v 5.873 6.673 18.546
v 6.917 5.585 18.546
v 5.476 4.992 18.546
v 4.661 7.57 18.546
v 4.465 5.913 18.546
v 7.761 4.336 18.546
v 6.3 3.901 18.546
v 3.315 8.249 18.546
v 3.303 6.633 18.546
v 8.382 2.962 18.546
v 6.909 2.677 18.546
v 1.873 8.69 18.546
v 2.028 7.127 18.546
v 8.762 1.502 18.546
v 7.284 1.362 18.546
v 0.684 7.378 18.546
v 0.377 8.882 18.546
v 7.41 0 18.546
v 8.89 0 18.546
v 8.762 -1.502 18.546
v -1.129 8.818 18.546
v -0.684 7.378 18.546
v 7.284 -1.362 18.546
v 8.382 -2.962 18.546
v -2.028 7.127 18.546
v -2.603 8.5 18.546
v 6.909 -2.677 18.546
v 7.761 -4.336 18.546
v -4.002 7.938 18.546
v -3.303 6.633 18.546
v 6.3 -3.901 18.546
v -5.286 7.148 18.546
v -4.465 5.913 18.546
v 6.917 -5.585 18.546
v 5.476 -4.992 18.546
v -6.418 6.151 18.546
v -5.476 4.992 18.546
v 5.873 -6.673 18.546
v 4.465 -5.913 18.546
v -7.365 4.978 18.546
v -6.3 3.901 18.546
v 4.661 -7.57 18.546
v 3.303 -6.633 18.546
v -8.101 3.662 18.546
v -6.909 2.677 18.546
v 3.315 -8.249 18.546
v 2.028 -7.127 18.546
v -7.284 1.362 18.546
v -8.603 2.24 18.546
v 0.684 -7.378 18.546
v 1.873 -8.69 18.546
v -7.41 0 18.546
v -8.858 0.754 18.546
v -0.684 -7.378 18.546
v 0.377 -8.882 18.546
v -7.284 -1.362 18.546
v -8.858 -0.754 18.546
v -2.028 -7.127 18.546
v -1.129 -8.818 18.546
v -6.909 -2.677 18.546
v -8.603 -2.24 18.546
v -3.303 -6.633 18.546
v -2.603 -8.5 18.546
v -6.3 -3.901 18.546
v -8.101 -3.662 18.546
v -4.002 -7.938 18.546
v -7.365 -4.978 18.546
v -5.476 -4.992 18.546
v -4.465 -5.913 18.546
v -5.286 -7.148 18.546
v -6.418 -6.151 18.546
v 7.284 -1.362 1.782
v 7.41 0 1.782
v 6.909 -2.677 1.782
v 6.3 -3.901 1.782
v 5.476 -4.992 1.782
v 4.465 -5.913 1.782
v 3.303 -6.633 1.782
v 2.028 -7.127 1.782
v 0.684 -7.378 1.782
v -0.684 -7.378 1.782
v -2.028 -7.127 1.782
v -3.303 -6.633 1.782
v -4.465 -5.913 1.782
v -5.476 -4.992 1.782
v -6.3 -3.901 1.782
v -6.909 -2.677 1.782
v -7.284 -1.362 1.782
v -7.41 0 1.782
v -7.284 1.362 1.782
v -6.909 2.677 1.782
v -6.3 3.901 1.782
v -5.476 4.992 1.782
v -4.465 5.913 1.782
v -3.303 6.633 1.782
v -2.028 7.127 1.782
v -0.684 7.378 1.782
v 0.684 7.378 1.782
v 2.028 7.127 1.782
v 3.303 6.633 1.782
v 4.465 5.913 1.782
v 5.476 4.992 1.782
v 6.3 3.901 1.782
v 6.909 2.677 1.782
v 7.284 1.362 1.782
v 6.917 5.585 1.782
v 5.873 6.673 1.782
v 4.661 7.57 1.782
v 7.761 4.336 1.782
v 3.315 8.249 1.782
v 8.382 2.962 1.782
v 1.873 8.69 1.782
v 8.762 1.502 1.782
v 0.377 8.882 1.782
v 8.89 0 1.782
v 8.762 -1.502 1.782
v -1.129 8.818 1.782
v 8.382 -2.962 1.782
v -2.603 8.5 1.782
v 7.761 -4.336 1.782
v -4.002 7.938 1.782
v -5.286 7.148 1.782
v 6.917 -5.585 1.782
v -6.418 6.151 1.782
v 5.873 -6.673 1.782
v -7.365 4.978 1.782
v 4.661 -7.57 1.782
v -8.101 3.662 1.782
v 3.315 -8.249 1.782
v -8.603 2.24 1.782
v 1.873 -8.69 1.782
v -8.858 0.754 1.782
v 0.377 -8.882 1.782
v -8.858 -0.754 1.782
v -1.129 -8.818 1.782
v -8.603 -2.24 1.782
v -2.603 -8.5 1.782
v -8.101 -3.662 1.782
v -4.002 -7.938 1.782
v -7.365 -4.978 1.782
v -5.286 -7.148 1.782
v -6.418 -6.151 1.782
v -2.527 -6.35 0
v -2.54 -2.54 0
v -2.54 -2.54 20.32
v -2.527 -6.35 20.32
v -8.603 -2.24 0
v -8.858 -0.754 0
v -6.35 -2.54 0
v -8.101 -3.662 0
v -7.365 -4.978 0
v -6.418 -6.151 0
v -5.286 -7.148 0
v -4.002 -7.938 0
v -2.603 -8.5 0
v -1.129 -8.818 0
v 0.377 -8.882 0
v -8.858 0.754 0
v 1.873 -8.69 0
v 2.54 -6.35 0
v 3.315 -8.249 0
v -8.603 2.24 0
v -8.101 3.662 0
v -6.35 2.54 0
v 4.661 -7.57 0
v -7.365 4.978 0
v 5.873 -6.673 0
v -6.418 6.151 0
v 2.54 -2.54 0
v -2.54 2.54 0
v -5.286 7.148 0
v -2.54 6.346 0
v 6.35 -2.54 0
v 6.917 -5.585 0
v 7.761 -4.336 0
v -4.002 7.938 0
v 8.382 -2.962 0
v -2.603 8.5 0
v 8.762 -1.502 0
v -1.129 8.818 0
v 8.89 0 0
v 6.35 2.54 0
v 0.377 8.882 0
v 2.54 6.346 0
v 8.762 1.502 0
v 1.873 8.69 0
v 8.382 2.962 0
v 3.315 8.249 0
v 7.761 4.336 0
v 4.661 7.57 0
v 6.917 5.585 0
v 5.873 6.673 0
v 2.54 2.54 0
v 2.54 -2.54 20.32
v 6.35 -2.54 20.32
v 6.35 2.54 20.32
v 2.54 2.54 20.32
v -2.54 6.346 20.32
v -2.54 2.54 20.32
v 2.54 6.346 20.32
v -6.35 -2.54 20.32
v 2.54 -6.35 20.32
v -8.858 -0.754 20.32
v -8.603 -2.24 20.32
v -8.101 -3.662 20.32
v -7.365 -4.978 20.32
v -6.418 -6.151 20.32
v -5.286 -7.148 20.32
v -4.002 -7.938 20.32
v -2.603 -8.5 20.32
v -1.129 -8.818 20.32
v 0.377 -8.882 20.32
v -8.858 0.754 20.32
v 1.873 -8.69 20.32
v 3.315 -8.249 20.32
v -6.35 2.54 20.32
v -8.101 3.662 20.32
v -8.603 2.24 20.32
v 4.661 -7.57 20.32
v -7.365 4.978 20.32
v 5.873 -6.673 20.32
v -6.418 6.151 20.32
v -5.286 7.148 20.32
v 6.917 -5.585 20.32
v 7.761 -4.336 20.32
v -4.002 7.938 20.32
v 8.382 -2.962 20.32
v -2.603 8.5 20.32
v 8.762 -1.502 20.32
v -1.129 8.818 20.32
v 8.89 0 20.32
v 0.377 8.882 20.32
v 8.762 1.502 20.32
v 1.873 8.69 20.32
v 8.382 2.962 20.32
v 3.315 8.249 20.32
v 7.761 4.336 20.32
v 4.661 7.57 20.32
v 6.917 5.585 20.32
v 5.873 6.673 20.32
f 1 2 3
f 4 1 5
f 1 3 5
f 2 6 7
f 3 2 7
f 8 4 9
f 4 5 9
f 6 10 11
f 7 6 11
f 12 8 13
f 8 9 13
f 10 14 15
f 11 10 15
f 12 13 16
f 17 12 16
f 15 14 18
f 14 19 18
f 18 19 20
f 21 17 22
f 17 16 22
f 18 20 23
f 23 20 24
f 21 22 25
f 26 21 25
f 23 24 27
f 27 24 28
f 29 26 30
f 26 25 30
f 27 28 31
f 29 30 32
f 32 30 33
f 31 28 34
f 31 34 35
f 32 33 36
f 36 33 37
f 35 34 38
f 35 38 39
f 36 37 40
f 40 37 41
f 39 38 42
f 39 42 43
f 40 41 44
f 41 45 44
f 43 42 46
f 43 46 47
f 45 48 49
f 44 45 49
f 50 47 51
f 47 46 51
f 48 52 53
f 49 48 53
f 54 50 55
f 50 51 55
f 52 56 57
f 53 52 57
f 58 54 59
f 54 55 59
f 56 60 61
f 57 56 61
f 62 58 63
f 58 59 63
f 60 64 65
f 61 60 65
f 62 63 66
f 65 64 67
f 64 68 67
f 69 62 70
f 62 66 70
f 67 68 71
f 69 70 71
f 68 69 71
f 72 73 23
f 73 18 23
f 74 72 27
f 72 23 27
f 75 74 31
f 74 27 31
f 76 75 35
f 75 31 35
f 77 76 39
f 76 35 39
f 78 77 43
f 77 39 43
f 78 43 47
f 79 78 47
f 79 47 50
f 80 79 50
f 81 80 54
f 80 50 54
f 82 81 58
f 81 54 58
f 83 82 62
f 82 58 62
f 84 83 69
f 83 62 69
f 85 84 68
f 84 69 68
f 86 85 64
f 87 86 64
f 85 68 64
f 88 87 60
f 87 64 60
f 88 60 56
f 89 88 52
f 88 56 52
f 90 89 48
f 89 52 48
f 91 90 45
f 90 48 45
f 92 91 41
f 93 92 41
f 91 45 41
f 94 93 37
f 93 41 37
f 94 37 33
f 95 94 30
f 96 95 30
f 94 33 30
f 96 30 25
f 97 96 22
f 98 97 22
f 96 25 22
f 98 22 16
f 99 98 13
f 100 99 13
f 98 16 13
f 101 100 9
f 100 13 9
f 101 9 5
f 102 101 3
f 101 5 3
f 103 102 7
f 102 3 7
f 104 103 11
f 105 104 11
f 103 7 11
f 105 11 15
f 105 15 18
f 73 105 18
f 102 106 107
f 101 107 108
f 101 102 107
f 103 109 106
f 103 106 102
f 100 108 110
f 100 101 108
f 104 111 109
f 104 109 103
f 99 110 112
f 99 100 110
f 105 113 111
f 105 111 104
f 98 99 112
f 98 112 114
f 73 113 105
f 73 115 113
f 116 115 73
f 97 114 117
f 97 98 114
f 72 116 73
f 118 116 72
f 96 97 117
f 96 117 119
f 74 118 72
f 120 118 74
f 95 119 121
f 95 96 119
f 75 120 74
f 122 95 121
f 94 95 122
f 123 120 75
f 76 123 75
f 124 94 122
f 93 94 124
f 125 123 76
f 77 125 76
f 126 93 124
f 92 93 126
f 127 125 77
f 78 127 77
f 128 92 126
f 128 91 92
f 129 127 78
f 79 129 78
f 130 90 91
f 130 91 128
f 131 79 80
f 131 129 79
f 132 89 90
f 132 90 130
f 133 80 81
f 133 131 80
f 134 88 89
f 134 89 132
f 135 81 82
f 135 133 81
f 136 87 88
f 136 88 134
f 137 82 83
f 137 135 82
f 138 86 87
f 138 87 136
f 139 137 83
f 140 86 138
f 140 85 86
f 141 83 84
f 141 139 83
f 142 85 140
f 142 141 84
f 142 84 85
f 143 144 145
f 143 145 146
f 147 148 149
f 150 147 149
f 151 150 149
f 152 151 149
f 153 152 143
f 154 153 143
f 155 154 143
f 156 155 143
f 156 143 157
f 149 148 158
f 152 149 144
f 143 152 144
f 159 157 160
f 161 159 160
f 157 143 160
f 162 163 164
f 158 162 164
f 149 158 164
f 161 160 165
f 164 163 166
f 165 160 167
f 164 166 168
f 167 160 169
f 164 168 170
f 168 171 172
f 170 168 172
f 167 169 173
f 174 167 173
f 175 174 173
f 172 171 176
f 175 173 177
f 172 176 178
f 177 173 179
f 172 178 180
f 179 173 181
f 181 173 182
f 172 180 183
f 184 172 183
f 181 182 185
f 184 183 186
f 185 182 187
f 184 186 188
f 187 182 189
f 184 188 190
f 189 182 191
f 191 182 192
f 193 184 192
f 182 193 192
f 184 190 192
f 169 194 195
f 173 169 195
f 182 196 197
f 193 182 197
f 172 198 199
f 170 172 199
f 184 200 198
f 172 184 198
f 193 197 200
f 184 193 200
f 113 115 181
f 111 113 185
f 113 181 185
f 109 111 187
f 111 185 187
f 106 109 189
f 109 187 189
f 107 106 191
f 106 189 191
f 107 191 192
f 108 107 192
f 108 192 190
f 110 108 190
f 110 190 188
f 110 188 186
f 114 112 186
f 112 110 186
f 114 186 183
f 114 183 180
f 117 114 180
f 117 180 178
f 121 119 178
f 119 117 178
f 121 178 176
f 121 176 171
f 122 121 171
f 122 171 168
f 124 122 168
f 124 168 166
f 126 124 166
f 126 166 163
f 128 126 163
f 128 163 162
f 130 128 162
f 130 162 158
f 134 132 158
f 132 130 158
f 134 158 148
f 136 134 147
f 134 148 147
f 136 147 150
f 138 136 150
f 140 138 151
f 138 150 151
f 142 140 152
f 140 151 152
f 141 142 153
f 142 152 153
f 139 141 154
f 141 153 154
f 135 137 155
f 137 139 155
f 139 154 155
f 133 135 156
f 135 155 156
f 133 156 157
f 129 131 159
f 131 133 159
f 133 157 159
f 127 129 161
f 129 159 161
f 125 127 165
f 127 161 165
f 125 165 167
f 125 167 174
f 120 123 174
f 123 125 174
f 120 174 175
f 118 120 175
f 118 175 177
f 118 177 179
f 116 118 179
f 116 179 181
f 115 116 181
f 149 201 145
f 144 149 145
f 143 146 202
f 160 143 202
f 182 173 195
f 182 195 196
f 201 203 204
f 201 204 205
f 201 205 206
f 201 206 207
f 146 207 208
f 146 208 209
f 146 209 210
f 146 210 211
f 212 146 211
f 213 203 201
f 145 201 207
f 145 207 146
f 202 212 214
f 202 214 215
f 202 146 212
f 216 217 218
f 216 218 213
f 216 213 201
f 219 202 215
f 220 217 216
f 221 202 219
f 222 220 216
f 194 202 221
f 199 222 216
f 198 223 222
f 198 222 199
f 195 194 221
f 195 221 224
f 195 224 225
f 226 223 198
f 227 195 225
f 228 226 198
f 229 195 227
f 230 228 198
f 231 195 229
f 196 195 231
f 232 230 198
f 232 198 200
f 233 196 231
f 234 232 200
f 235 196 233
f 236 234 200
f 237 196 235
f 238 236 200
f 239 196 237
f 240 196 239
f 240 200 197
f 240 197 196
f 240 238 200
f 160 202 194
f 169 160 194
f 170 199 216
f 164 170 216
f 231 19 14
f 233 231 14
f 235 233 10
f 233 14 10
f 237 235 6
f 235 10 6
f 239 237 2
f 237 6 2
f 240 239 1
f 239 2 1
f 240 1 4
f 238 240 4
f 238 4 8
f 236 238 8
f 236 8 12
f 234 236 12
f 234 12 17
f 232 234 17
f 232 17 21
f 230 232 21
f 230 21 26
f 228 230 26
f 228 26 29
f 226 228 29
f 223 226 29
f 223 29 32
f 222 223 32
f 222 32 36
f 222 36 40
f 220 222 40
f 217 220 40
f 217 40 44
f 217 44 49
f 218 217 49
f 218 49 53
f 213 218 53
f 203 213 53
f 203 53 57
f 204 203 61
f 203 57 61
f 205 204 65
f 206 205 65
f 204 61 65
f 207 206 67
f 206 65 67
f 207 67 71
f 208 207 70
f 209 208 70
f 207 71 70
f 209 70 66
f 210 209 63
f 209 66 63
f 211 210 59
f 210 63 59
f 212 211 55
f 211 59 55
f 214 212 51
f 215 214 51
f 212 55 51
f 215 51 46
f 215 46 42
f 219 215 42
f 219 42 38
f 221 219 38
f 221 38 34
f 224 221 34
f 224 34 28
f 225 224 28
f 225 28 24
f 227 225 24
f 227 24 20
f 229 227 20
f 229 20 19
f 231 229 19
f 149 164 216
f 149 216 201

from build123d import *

# Parameters (mm, degrees)
F0_R     = 8.89
F1_DEPTH = 20.32
F3_DEPTH = 20.32
F4_W     = 3.678773
F4_H     = 16.764444


with BuildPart() as f1:
    # F0 (on Top) → F1 (new body)
    with BuildSketch(Plane.XY):
        Circle(F0_R)
    extrude(amount=F1_DEPTH)

    # F2 (on face) → F3 (cut)
    with BuildSketch(Plane.XY.offset(20.32)):
        Polygon((-2.526941, -6.35), (0, -6.35), (2.54, -6.35), (2.54, -2.54), (6.35, -2.54), (6.35, 0), (6.35, 2.540121), (2.54, 2.540121), (2.54, 6.345605), (0, 6.345605), (-2.54, 6.345605), (-2.54, 2.540121), (-6.35, 2.540121), (-6.35, 0), (-6.35, -2.54), (-2.54, -2.54), align=None)
    extrude(amount=-F3_DEPTH, mode=Mode.SUBTRACT)

    # F4 (on Front) → F5 (revolve, cut)
    with BuildSketch(Plane.XZ):
        with Locations((9.249083, 10.164065)):
            Rectangle(F4_W, F4_H)
    revolve(axis=Axis((0, 0, 10.164065), (0, 0, -1)), mode=Mode.SUBTRACT)


solid = f1.part
